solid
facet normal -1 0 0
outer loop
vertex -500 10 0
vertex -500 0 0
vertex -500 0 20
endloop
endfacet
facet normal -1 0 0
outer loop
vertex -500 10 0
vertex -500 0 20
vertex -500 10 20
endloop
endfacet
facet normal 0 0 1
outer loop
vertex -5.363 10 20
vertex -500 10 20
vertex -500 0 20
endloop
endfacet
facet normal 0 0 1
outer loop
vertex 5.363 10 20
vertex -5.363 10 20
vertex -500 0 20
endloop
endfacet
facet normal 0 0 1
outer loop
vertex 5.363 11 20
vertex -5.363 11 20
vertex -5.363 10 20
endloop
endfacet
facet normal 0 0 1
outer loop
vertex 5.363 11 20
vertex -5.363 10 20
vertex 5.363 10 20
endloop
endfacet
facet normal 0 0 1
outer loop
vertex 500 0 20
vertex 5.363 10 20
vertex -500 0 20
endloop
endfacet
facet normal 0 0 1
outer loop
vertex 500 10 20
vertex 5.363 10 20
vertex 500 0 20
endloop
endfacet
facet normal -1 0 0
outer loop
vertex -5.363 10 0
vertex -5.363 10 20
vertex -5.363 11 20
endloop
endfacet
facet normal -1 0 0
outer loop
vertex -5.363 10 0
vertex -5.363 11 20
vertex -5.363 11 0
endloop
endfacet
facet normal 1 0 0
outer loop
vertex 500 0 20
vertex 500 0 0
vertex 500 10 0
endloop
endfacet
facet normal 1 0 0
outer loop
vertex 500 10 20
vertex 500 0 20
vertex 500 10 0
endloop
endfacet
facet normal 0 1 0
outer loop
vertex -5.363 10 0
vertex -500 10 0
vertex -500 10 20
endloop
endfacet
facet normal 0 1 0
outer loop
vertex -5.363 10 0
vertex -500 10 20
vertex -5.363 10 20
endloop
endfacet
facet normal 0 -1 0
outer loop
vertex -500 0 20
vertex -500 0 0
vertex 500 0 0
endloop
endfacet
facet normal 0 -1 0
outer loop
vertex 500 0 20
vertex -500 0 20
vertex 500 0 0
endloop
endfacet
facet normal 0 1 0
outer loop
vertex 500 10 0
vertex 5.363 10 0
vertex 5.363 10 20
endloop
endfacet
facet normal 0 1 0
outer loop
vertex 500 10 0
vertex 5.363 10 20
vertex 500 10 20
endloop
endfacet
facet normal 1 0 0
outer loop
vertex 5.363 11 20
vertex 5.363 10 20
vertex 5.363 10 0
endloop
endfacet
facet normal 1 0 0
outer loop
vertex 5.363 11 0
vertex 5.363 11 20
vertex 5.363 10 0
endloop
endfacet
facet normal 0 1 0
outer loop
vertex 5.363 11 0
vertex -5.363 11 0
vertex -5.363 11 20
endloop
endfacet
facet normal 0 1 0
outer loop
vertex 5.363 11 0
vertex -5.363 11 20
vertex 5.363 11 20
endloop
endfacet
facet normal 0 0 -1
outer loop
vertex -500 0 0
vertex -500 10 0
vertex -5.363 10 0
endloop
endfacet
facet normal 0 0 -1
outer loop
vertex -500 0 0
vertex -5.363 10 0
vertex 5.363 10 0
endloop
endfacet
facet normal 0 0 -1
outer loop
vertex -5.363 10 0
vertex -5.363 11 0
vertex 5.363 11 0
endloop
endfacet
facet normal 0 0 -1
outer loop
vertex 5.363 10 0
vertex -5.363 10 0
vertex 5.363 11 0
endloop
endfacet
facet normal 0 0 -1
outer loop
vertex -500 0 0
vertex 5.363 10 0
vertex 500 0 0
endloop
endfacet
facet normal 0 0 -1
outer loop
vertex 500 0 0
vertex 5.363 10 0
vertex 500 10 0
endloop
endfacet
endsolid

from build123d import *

# Parameters (mm, degrees)
SKETCH2_W           = 1000
SKETCH2_H           = 10
EXTRUDE_THIN1_DEPTH = 20
SKETCH4_W           = 10.725253094
SKETCH4_H           = 20
BOSS_EXTRUDE1_DEPTH = 1


with BuildPart() as part:
    # Sketch2 → Extrude-Thin1 (new body)
    with BuildSketch(Plane.XY):
        with Locations((0, 5)):
            Rectangle(SKETCH2_W, SKETCH2_H)
    extrude(amount=EXTRUDE_THIN1_DEPTH)

    # Sketch4 → Boss-Extrude1 (add)
    with BuildSketch(Plane(origin=(0, 10, 0), x_dir=(1, 0, 0), z_dir=(0, 1, 0))):
        with Locations((0, -10)):
            Rectangle(SKETCH4_W, SKETCH4_H)
    extrude(amount=BOSS_EXTRUDE1_DEPTH)


solid = part.part
